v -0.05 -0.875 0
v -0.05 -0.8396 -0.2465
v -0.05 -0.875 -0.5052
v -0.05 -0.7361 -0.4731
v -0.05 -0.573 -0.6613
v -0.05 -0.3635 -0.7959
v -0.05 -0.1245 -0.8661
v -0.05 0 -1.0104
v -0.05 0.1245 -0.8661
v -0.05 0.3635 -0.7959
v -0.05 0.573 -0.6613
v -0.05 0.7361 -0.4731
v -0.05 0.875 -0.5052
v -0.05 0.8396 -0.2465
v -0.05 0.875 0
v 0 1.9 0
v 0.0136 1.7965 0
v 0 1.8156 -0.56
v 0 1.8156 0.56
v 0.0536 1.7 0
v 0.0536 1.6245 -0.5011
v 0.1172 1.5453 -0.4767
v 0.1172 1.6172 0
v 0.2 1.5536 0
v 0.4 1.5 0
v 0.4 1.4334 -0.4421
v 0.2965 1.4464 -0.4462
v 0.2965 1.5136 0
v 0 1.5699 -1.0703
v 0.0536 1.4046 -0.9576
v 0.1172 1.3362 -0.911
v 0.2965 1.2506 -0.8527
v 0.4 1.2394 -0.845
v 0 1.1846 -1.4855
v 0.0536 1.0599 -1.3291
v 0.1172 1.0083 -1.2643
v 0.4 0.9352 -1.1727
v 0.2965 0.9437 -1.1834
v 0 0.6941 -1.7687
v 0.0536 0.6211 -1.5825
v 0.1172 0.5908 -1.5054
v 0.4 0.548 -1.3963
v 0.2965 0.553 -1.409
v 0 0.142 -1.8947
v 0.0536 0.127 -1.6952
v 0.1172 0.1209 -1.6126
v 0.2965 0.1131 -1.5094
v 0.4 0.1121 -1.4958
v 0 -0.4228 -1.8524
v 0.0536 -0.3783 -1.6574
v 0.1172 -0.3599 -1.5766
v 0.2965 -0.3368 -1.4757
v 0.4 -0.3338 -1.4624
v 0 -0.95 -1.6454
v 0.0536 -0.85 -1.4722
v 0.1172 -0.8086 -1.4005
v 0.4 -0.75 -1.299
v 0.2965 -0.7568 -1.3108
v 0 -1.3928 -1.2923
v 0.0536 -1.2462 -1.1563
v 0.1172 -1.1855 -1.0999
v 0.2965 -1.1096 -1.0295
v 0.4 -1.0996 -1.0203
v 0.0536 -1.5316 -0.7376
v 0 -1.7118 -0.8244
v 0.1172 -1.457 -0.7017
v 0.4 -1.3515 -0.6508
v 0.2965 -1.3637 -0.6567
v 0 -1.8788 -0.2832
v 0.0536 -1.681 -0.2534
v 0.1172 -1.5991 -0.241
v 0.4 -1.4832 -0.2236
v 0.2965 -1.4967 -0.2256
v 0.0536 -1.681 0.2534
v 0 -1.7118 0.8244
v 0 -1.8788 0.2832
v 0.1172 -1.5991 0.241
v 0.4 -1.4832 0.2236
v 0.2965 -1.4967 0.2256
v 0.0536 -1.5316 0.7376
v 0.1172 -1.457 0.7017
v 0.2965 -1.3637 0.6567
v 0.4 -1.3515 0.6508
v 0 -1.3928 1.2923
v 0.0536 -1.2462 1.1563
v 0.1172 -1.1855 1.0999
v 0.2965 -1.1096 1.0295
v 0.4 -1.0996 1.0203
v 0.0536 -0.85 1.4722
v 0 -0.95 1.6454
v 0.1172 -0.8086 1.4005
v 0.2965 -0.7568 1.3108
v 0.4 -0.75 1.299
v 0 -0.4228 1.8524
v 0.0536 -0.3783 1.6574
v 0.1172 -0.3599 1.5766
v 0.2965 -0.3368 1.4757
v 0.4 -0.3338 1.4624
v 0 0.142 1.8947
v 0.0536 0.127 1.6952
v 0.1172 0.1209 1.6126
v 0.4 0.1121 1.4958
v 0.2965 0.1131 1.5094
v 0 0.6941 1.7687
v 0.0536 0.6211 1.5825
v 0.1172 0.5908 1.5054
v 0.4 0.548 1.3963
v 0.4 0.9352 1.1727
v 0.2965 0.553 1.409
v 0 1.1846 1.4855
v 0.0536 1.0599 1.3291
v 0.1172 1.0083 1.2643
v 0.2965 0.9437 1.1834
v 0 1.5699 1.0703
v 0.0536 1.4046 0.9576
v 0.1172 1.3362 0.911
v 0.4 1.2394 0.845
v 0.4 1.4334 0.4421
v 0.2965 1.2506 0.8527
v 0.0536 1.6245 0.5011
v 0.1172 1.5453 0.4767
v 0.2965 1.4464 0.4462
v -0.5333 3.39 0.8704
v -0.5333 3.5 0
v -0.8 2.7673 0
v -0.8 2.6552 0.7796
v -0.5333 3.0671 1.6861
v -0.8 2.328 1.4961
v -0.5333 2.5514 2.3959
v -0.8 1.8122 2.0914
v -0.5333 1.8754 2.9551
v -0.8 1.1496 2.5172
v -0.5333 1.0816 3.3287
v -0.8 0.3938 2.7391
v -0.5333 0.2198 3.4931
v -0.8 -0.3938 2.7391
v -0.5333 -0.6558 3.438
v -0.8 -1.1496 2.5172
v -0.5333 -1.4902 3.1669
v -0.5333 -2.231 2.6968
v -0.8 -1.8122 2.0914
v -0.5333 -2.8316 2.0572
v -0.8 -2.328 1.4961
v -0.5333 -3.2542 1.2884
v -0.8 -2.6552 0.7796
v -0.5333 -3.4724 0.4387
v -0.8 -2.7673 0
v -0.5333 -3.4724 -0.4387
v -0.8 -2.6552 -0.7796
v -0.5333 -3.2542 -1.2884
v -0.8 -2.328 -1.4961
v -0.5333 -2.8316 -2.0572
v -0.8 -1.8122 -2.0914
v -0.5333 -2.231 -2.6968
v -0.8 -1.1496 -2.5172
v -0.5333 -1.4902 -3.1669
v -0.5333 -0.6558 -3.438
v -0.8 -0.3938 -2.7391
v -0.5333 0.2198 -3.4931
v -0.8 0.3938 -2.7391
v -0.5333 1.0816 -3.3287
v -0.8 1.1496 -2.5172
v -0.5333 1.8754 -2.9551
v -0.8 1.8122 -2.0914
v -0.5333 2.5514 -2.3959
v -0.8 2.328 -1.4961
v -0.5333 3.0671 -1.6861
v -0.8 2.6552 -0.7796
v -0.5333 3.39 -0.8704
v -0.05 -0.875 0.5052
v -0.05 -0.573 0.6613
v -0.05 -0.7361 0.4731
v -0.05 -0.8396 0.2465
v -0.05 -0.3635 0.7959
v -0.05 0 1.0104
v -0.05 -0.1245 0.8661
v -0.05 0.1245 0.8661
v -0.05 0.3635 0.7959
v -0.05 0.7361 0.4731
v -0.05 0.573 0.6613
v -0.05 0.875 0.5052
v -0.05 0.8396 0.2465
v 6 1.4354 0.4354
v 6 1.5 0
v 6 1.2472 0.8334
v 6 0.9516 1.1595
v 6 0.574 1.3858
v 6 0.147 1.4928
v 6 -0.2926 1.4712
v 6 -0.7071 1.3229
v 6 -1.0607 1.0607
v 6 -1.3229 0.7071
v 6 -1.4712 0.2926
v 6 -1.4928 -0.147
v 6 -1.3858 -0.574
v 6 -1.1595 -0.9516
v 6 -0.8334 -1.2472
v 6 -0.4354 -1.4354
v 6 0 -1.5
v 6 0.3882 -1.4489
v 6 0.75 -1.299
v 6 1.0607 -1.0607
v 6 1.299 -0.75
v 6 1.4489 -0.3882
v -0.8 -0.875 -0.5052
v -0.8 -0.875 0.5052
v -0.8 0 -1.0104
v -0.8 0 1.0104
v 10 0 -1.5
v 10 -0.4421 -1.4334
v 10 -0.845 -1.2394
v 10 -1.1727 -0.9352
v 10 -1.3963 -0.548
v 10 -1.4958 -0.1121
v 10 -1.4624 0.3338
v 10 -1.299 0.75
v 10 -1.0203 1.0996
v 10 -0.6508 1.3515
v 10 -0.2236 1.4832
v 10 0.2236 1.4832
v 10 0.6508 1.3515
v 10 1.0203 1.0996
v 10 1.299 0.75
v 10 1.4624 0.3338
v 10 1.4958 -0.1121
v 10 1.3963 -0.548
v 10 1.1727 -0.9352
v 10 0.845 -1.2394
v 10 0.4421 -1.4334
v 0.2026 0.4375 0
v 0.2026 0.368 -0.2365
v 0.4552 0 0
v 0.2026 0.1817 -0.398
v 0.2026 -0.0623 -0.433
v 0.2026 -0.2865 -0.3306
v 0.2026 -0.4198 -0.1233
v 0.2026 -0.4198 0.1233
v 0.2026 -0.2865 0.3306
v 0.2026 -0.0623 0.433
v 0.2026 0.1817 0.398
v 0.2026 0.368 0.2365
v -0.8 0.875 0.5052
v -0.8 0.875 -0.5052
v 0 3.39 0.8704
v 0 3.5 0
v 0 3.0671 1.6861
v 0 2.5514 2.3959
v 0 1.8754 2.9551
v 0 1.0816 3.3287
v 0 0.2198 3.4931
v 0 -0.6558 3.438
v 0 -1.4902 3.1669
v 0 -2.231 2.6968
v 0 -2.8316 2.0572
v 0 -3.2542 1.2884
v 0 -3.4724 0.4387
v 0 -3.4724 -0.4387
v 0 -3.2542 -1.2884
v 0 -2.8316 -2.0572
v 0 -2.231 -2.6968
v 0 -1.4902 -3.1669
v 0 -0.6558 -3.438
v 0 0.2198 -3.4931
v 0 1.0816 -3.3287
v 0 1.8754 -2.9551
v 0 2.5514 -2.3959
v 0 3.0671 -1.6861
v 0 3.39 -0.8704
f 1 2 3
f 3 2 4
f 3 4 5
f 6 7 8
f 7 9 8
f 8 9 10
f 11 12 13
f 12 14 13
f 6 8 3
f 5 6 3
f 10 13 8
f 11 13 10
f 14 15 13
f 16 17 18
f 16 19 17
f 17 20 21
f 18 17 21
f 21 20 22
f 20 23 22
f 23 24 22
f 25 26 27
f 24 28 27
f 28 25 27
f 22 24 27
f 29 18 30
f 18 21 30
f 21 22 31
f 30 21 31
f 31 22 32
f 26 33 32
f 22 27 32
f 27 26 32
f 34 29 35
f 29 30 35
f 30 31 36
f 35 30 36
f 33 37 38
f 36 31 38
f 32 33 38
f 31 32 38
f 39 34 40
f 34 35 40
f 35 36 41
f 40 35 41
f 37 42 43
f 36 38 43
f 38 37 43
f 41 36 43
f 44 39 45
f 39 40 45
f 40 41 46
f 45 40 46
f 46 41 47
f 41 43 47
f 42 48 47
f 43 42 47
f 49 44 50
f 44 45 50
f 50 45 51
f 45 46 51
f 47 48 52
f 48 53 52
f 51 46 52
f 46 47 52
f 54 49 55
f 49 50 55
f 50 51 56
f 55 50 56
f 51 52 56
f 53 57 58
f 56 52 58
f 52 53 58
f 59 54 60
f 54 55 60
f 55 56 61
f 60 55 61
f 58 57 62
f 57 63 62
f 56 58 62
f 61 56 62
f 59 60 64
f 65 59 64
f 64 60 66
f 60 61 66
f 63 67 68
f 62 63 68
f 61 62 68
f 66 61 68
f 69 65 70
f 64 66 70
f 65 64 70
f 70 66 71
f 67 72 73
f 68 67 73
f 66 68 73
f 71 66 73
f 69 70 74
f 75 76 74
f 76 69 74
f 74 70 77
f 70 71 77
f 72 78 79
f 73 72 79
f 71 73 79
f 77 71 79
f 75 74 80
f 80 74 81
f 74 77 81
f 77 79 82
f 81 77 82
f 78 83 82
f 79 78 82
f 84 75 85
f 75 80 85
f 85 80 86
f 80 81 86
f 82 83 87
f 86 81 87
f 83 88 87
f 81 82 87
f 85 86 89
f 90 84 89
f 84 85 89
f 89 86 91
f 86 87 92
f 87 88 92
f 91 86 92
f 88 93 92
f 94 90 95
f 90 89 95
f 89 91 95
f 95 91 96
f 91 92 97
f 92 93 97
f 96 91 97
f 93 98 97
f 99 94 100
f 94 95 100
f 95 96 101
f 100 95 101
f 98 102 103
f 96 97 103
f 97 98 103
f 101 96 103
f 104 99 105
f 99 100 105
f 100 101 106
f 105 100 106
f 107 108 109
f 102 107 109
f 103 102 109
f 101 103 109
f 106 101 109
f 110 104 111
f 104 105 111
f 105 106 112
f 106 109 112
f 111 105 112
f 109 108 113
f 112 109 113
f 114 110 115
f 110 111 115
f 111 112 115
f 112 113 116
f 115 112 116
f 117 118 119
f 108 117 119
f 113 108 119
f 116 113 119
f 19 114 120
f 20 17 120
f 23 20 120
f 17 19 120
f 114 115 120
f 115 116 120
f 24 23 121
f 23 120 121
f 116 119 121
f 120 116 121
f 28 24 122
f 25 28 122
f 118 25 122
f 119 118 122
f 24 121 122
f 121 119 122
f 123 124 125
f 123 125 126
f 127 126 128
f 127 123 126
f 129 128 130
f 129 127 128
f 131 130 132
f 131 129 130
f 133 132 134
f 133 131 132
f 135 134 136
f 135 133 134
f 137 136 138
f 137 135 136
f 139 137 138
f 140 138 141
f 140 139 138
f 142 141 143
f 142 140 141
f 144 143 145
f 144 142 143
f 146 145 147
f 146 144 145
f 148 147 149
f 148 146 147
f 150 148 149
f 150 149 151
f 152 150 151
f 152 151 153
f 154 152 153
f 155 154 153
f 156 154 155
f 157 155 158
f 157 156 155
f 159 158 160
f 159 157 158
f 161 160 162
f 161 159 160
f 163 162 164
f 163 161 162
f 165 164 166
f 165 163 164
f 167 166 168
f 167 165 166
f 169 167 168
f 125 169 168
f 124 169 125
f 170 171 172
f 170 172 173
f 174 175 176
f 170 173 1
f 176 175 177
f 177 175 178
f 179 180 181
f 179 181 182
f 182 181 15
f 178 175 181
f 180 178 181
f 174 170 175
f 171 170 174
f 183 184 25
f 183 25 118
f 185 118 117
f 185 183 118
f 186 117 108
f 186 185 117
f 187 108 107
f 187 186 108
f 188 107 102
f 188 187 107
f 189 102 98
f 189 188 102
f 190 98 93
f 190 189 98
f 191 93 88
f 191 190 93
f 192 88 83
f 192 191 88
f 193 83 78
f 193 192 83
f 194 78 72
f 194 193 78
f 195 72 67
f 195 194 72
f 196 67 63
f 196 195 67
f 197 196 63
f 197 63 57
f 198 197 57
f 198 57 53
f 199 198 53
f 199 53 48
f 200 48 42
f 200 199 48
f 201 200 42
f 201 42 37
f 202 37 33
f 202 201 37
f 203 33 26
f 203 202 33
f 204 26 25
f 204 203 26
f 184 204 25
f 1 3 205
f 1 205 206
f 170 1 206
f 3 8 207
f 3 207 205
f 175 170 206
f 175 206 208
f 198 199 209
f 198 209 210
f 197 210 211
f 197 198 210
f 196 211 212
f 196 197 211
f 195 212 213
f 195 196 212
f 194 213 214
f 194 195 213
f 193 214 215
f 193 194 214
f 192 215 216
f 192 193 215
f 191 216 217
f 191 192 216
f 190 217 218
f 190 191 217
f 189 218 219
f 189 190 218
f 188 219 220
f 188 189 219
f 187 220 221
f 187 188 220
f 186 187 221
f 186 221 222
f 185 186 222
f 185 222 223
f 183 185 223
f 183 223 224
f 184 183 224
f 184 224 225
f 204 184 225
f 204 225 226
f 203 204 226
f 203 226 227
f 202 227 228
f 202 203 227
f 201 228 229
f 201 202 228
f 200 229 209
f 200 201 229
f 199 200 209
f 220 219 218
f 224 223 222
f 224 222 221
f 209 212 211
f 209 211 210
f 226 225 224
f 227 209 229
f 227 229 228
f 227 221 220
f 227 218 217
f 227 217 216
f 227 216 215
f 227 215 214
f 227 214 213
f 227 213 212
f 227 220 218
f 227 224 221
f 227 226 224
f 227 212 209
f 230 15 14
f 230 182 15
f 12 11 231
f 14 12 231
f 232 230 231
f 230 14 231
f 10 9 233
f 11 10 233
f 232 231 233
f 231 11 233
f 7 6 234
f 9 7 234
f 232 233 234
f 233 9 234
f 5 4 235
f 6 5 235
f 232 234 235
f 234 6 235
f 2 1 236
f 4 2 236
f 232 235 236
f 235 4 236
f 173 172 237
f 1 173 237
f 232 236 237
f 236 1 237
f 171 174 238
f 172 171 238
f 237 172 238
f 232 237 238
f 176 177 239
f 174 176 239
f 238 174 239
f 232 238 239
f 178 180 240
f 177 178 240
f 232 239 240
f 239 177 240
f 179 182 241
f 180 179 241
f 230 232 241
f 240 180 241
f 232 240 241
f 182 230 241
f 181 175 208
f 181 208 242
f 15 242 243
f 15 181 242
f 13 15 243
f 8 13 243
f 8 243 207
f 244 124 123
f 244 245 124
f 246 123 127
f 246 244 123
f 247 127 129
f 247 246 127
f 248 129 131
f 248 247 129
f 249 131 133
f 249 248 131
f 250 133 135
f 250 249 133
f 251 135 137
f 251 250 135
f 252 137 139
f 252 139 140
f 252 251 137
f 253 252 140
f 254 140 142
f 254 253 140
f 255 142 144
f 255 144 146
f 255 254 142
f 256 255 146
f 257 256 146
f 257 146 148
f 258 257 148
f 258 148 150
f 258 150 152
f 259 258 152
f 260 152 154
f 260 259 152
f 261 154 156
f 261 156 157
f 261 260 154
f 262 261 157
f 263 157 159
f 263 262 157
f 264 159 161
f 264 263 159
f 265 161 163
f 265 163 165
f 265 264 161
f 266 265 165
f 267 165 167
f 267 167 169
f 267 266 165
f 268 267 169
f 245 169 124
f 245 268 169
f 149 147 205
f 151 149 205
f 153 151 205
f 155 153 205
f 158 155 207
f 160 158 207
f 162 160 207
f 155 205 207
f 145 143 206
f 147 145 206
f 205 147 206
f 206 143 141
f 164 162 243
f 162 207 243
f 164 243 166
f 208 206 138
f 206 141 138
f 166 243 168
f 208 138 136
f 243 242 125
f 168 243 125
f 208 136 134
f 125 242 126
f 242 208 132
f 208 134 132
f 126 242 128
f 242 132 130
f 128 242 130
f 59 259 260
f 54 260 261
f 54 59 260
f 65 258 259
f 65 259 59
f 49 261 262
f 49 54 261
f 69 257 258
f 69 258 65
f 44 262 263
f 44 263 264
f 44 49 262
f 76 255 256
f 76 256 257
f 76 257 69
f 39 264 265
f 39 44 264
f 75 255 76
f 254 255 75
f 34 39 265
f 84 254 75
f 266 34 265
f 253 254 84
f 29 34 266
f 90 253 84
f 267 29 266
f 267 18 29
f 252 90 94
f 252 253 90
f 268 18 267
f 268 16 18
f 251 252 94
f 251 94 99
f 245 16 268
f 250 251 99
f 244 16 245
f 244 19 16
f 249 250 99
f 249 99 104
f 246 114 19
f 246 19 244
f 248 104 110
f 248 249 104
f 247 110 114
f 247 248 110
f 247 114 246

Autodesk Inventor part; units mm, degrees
ref_plane "YZ Plane" through (0, 0, 0) normal (1, 0, 0) x (0, 1, 0)
ref_plane "XZ Plane" through (0, 0, 0) normal (0, 1, 0) x (-1, 0, 0)
ref_plane "XY Plane" through (0, 0, 0) normal (0, 0, 1) x (1, 0, 0)
sketch "Sketch_1" plane through (0, 0, 0) normal (0, 0, 1) x (1, 0, 0)
  line L0 (6, 0) -> (0, 0)
  line L1 (-0.8, 0) -> (-0.8, 2.7673)
  line L2 (-0.8, 2.7673) -> (-0.5333, 3.5)
  line L3 (-0.5333, 3.5) -> (0, 3.5)
  line L4 (0, 3.5) -> (0, 1.9)
  arc A0 (0, 1.9) -> (0.4, 1.5) centre (0.4, 1.9) ccw
  line L5 (0.4, 1.5) -> (6, 1.5)
  line L6 (6, 1.5) -> (6, 0)
  line L7 (6, 0) -> (-0.8, 0)
  line L8 (0, 0) -> (-0.8, 0)
  dimension "d6" = 6
revolve "Revolution1" add sketch "Sketch_1" angle 360 about axis through (6, 0, 0) along (1, 0, 0)
sketch "Sketch_5" plane through (-0.05, 0, 0) normal (1, 0, 0) x (0, 0, -1)
  arc A0 (-0.6801, -0.1159) -> (-0.4404, -0.531) centre (-0.5499, -0.3175) ccw
  arc A1 (-0.341, -0.5357) -> (-0.4404, -0.531) centre (-0.3947, -0.62) ccw
  arc A2 (-0.341, -0.5357) -> (-0.2934, -0.5632) centre (0, 0) ccw
  arc A3 (-0.2397, -0.6469) -> (-0.2934, -0.5632) centre (-0.3396, -0.6519) ccw
  arc A4 (-0.2397, -0.6469) -> (0.2397, -0.6469) centre (0, -0.635) ccw
  arc A5 (0.2934, -0.5632) -> (0.2397, -0.6469) centre (0.3396, -0.6519) ccw
  arc A6 (0.2934, -0.5632) -> (0.341, -0.5357) centre (0, 0) ccw
  arc A7 (0.4404, -0.531) -> (0.341, -0.5357) centre (0.3947, -0.62) ccw
  arc A8 (0.4404, -0.531) -> (0.6801, -0.1159) centre (0.5499, -0.3175) ccw
  arc A9 (0.6344, -0.0275) -> (0.6801, -0.1159) centre (0.7343, -0.0318) ccw
  arc A10 (0.6344, -0.0275) -> (0.6344, 0.0275) centre (0, 0) ccw
  arc A11 (0.6801, 0.1159) -> (0.6344, 0.0275) centre (0.7343, 0.0318) ccw
  arc A12 (0.6801, 0.1159) -> (0.4404, 0.531) centre (0.5499, 0.3175) ccw
  arc A13 (0.341, 0.5357) -> (0.4404, 0.531) centre (0.3947, 0.62) ccw
  arc A14 (0.341, 0.5357) -> (0.2934, 0.5632) centre (0, 0) ccw
  arc A15 (0.2397, 0.6469) -> (0.2934, 0.5632) centre (0.3396, 0.6519) ccw
  arc A16 (0.2397, 0.6469) -> (-0.2397, 0.6469) centre (0, 0.635) ccw
  arc A17 (-0.2934, 0.5632) -> (-0.2397, 0.6469) centre (-0.3396, 0.6519) ccw
  arc A18 (-0.2934, 0.5632) -> (-0.341, 0.5357) centre (0, 0) ccw
  arc A19 (-0.4404, 0.531) -> (-0.341, 0.5357) centre (-0.3947, 0.62) ccw
  arc A20 (-0.4404, 0.531) -> (-0.6801, 0.1159) centre (-0.5499, 0.3175) ccw
  arc A21 (-0.6344, 0.0275) -> (-0.6801, 0.1159) centre (-0.7343, 0.0318) ccw
  arc A22 (-0.6344, 0.0275) -> (-0.6344, -0.0275) centre (0, 0) ccw
  arc A23 (-0.6801, -0.1159) -> (-0.6344, -0.0275) centre (-0.7343, -0.0318) ccw
  line L0 (0.5052, 0.875) -> (1.0104, 0)
  line L1 (1.0104, 0) -> (0.5052, -0.875)
  line L2 (0.5052, -0.875) -> (-0.5052, -0.875)
  line L3 (-0.5052, -0.875) -> (-1.0104, 0)
  line L4 (-1.0104, 0) -> (-0.5052, 0.875)
  line L5 (-0.5052, 0.875) -> (0.5052, 0.875)
  point P0 (0, 0.875)
  point P1 (0.7578, 0.4375)
  point P2 (-0.7578, 0.4375)
  point P3 (0, -0.875)
  point P4 (0.7578, -0.4375)
  point P5 (-0.7578, -0.4375)
extrude "Extrusion1" cut sketch "Sketch_5" against normal blind 0.75
sketch "Sketch_2" plane through (0, 0, 0) normal (0, 0, 1) x (1, 0, 0)
  line L0 (0.4552, 0) -> (0, 0)
  line L1 (-0.05, 0) -> (-0.05, 0.875)
  line L2 (-0.05, 0.875) -> (0.4552, 0)
  line L3 (0.4552, 0) -> (-0.05, 0)
  line L4 (-0.05, 0.875) -> (-0.8, 0.875) projected
revolve "Revolution2" cut sketch "Sketch_2" angle 360 about axis through (0.4552, 0, 0) along (1, 0, 0)
sketch "スケッチ4" plane through (6, 0, 0) normal (1, 0, 0) x (0, 0, -1)
  circle A0 centre (0, 0) radius 1.5 projected
extrude "押し出し2" add sketch "スケッチ4" along normal blind 4
thread "Thread1" size "M3x0.5" class "6g" standard "ANSI Metric M Profile" length 9.5 offset 0.1
properties part number "超極低頭ネジL10M3" material "ステンレス鋼 440C"
